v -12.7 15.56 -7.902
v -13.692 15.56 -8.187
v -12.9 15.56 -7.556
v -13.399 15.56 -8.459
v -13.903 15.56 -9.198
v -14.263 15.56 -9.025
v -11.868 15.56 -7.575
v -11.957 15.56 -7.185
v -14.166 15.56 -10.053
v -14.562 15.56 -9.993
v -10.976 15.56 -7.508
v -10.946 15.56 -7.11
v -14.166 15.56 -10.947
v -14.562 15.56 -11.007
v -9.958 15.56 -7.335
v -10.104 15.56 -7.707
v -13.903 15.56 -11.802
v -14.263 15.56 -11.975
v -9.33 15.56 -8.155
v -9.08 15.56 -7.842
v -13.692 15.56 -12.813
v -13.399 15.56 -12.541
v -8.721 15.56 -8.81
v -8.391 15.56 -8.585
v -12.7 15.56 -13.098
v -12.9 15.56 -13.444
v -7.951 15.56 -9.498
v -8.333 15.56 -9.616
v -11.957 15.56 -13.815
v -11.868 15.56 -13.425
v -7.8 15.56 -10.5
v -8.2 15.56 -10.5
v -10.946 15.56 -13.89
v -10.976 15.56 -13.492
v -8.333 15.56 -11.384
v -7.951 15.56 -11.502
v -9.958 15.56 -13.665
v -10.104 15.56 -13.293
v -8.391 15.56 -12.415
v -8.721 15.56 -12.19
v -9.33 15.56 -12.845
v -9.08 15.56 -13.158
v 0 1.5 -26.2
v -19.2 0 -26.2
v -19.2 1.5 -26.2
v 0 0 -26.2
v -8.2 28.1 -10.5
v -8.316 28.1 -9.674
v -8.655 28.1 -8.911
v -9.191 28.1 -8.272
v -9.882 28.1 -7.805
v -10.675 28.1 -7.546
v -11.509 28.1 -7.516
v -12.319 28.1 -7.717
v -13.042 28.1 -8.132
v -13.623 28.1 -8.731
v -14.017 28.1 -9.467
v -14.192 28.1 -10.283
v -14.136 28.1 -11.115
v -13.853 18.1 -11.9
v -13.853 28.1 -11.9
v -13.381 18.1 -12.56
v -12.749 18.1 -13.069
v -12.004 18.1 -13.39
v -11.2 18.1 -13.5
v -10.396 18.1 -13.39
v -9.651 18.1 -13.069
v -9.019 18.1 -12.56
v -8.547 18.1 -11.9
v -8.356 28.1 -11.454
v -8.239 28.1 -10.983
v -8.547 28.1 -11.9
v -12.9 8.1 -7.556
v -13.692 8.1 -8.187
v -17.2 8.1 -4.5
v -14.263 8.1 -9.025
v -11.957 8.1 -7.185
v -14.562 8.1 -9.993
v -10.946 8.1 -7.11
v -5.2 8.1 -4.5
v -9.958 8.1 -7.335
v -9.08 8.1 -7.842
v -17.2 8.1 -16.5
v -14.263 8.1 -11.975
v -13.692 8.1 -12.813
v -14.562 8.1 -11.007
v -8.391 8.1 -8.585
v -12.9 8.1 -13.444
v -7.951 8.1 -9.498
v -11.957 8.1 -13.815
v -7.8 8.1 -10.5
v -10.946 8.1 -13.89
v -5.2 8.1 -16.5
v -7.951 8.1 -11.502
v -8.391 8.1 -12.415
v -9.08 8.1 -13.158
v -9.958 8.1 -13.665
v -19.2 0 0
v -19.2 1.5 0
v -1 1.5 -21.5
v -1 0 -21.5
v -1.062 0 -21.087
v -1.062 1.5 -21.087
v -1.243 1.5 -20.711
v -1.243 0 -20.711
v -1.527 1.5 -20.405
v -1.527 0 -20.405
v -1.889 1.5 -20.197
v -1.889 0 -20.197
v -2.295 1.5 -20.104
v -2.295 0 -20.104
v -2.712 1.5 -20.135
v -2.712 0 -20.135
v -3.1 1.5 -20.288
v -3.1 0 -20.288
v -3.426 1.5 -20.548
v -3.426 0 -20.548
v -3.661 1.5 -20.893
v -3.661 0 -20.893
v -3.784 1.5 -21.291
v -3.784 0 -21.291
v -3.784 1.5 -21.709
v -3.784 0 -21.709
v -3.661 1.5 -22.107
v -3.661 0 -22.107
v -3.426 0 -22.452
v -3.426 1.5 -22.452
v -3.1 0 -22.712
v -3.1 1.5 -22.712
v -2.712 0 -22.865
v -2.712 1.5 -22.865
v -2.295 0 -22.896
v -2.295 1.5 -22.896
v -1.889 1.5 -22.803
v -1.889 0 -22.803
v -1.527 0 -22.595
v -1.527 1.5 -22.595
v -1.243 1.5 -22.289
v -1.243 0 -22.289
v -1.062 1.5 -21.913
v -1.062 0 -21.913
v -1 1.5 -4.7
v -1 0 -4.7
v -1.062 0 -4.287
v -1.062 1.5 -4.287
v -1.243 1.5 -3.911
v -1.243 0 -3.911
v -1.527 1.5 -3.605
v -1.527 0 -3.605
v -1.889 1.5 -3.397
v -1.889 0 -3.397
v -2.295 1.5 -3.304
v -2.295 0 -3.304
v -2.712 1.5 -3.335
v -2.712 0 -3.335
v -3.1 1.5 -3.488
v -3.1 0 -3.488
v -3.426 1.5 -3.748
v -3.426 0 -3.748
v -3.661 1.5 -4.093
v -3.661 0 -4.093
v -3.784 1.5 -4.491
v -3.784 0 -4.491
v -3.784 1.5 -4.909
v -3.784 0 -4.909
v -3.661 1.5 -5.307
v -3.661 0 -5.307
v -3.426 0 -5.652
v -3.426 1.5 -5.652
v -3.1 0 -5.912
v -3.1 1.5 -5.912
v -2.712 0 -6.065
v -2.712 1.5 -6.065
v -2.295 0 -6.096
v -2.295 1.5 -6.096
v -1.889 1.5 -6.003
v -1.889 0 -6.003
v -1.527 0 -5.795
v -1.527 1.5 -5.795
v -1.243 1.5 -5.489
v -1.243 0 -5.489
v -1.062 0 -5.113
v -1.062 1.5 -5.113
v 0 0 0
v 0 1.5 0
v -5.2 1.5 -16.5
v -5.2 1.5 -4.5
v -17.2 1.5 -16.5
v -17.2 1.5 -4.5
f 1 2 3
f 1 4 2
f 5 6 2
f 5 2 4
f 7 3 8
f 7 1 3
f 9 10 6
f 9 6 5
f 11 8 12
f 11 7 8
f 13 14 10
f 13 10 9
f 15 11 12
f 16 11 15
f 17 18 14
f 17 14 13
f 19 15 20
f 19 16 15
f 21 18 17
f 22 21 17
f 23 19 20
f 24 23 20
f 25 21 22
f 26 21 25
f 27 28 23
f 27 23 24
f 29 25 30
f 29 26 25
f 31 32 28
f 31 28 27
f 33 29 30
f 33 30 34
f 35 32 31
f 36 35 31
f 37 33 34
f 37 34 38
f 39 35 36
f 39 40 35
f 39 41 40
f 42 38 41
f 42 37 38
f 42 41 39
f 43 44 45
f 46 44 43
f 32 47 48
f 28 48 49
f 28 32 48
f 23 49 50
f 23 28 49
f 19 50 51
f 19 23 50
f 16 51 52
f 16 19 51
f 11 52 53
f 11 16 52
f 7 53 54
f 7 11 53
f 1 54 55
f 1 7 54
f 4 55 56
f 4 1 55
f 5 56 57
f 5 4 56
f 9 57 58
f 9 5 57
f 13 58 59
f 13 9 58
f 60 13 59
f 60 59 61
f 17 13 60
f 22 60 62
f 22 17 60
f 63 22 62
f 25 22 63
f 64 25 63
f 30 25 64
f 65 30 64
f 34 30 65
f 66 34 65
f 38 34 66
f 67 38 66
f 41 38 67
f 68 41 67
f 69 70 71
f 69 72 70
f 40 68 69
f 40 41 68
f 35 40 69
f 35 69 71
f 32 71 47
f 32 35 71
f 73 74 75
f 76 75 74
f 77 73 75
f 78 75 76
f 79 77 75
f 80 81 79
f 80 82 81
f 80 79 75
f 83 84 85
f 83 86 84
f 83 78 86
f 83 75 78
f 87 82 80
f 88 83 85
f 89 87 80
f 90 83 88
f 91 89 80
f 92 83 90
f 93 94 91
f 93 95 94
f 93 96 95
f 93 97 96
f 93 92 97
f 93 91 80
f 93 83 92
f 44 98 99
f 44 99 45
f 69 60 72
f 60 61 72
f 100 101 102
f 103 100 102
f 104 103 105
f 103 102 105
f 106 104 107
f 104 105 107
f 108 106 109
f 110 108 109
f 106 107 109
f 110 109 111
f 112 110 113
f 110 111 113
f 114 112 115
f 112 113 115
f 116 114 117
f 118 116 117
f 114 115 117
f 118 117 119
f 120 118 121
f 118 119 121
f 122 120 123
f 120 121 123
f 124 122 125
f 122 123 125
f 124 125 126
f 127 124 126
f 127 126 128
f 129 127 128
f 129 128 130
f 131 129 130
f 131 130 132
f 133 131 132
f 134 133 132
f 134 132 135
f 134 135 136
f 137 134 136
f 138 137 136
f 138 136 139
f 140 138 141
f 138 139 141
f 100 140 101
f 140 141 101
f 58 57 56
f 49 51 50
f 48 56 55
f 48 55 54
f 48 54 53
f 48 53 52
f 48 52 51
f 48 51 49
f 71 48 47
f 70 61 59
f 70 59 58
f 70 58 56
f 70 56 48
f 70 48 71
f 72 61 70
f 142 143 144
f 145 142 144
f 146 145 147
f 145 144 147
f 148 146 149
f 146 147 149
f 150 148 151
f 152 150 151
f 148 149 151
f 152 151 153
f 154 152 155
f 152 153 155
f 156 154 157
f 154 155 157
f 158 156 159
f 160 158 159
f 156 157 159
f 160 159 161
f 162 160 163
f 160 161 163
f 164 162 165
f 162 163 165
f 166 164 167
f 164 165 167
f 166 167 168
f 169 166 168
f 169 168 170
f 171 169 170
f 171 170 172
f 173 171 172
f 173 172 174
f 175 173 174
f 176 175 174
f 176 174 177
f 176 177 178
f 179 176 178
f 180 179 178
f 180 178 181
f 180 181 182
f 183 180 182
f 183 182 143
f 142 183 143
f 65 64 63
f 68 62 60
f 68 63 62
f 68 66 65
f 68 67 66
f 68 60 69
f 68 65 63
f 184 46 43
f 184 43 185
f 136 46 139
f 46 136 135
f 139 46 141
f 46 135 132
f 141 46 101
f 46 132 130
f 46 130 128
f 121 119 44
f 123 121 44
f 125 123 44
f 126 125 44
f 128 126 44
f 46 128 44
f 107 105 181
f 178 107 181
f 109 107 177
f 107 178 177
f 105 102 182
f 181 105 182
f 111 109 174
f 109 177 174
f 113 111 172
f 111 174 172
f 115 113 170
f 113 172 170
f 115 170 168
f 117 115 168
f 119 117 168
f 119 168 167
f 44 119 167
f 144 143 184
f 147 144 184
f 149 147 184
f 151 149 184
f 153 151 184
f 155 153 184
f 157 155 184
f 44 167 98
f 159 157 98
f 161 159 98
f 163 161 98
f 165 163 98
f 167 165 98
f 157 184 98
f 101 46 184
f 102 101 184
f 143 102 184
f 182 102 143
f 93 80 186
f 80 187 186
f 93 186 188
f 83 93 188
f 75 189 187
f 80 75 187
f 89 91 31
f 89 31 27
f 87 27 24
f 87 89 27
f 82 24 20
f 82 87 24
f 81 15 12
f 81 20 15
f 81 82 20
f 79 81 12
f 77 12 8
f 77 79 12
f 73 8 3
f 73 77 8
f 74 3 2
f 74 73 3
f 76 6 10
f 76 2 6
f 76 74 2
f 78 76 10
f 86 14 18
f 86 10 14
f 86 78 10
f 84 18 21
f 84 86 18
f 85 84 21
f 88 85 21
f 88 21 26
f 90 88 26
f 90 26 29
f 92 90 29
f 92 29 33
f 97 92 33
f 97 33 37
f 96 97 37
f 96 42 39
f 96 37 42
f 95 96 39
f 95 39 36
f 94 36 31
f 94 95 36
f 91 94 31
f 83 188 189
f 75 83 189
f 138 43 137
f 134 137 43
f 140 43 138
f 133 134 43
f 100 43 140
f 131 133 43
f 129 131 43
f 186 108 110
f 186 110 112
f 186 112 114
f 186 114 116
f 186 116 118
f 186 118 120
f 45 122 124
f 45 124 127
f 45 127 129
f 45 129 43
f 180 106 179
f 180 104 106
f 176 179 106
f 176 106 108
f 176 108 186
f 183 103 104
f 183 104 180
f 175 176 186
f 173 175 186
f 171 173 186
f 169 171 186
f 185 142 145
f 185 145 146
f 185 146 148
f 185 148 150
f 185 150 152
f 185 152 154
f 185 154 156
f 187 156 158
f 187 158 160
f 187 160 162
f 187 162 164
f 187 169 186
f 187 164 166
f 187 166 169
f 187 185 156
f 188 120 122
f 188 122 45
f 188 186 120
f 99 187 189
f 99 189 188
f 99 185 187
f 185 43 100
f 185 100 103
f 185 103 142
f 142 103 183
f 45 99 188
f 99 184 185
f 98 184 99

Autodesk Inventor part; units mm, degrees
ref_plane "YZ Plane" through (0, 0, 0) normal (1, 0, 0) x (0, 1, 0)
ref_plane "XZ Plane" through (0, 0, 0) normal (0, 1, 0) x (-1, 0, 0)
ref_plane "XY Plane" through (0, 0, 0) normal (0, 0, 1) x (1, 0, 0)
sketch "草圖2" plane through (0, 0, 0) normal (0, 1, 0) x (-1, 0, 0)
  line L0 (0, 0) -> (19.2, 0)
  line L1 (19.2, 0) -> (19.2, -26.2)
  line L2 (19.2, -26.2) -> (0, -26.2)
  line L3 (0, -26.2) -> (0, 0)
  dimension "d4" = 26.2
  dimension "d5" = 19.2
extrude "擠出2" add sketch "草圖2" along normal blind 1.5
sketch "草圖3" plane through (0, 1.5, 0) normal (0, 1, 0) x (1, 0, 0)
  line L0 (-19.2, 0) -> (0, 0) projected
  line L1 (-19.2, 26.2) -> (-19.2, 0) projected
  line L2 (-17.2, 4.5) -> (-5.2, 4.5)
  line L3 (-5.2, 4.5) -> (-5.2, 16.5)
  line L4 (-5.2, 16.5) -> (-17.2, 16.5)
  line L5 (-17.2, 16.5) -> (-17.2, 4.5)
  dimension "d8" = 4.5
  dimension "d9" = 2
  dimension "d10" = 12
  dimension "d11" = 12
extrude "擠出3" add sketch "草圖3" along normal blind 6.6
sketch "草圖4" plane through (0, 8.1, 0) normal (0, 1, 0) x (1, 0, 0)
  line L0 (-5.2, 4.5) -> (-5.2, 16.5) projected
  line L1 (-5.2, 16.5) -> (-17.2, 16.5) projected
  line L2 (-17.2, 16.5) -> (-17.2, 4.5) projected
  line L3 (-17.2, 4.5) -> (-5.2, 4.5) projected
  circle A0 centre (-11.2, 10.5) radius 3.4
  point P0 (0, 0)
  dimension "d14" = 6
  dimension "d15" = 6
  dimension "d16" = 6.8
extrude "擠出4" add sketch "草圖4" along normal blind 7.46 contours A0
sketch "草圖5" plane through (-11.2, 15.56, -10.5) normal (0, 1, 0) x (1, 0, 0)
  circle A0 centre (0, 0) radius 3.4 projected
  circle A1 centre (0, 0) radius 3
  point P0 (11.2, -10.5)
  dimension "d19" = 6
extrude "擠出5" add sketch "草圖5" along normal blind 12.54 contours A1
thread "螺紋1" size "M7x1" class "6g" standard "ANSI Metric M Profile" full length
sketch "草圖6" plane through (-11.2, 28.1, -10.5) normal (0, 1, 0) x (1, 0, 0)
  line L0 (-3, 1.4) -> (3, 1.4)
  line L1 (3, 1.4) -> (3, 3)
  line L2 (3, 3) -> (-3, 3)
  line L3 (-3, 3) -> (-3, 1.4)
  circle A0 centre (0, 0) radius 3 projected
  point P0 (11.2, -10.5)
  point P1 (0, 3)
  point P2 (0, 3)
  point P3 (-3, 0)
  dimension "d24" = 1.6
  dimension "d25" = 6
extrude "擠出6" cut sketch "草圖6" against normal blind 10 contours L3 L2 A0 L0 | A0 L0 | A0 L2 L1 L0 picked at (0.7632, 1.5795)
sketch "草圖7" plane through (0, 0, 0) normal (0, -1, 0) x (1, 0, 0)
  circle A0 centre (-2.4, -4.7) radius 1.4
  circle A1 centre (-2.4, -21.5) radius 1.4
  line L0 (0, 0) -> (0, -26.2) projected
  line L1 (-19.2, 0) -> (0, 0) projected
  dimension "d29" = 16.8
  dimension "d30" = 2.8
  dimension "d31" = 2.4
  dimension "d33" = 4.7
extrude "擠出7" cut sketch "草圖7" against normal up to surface (1.5 mm away)
properties part number "編碼器"
